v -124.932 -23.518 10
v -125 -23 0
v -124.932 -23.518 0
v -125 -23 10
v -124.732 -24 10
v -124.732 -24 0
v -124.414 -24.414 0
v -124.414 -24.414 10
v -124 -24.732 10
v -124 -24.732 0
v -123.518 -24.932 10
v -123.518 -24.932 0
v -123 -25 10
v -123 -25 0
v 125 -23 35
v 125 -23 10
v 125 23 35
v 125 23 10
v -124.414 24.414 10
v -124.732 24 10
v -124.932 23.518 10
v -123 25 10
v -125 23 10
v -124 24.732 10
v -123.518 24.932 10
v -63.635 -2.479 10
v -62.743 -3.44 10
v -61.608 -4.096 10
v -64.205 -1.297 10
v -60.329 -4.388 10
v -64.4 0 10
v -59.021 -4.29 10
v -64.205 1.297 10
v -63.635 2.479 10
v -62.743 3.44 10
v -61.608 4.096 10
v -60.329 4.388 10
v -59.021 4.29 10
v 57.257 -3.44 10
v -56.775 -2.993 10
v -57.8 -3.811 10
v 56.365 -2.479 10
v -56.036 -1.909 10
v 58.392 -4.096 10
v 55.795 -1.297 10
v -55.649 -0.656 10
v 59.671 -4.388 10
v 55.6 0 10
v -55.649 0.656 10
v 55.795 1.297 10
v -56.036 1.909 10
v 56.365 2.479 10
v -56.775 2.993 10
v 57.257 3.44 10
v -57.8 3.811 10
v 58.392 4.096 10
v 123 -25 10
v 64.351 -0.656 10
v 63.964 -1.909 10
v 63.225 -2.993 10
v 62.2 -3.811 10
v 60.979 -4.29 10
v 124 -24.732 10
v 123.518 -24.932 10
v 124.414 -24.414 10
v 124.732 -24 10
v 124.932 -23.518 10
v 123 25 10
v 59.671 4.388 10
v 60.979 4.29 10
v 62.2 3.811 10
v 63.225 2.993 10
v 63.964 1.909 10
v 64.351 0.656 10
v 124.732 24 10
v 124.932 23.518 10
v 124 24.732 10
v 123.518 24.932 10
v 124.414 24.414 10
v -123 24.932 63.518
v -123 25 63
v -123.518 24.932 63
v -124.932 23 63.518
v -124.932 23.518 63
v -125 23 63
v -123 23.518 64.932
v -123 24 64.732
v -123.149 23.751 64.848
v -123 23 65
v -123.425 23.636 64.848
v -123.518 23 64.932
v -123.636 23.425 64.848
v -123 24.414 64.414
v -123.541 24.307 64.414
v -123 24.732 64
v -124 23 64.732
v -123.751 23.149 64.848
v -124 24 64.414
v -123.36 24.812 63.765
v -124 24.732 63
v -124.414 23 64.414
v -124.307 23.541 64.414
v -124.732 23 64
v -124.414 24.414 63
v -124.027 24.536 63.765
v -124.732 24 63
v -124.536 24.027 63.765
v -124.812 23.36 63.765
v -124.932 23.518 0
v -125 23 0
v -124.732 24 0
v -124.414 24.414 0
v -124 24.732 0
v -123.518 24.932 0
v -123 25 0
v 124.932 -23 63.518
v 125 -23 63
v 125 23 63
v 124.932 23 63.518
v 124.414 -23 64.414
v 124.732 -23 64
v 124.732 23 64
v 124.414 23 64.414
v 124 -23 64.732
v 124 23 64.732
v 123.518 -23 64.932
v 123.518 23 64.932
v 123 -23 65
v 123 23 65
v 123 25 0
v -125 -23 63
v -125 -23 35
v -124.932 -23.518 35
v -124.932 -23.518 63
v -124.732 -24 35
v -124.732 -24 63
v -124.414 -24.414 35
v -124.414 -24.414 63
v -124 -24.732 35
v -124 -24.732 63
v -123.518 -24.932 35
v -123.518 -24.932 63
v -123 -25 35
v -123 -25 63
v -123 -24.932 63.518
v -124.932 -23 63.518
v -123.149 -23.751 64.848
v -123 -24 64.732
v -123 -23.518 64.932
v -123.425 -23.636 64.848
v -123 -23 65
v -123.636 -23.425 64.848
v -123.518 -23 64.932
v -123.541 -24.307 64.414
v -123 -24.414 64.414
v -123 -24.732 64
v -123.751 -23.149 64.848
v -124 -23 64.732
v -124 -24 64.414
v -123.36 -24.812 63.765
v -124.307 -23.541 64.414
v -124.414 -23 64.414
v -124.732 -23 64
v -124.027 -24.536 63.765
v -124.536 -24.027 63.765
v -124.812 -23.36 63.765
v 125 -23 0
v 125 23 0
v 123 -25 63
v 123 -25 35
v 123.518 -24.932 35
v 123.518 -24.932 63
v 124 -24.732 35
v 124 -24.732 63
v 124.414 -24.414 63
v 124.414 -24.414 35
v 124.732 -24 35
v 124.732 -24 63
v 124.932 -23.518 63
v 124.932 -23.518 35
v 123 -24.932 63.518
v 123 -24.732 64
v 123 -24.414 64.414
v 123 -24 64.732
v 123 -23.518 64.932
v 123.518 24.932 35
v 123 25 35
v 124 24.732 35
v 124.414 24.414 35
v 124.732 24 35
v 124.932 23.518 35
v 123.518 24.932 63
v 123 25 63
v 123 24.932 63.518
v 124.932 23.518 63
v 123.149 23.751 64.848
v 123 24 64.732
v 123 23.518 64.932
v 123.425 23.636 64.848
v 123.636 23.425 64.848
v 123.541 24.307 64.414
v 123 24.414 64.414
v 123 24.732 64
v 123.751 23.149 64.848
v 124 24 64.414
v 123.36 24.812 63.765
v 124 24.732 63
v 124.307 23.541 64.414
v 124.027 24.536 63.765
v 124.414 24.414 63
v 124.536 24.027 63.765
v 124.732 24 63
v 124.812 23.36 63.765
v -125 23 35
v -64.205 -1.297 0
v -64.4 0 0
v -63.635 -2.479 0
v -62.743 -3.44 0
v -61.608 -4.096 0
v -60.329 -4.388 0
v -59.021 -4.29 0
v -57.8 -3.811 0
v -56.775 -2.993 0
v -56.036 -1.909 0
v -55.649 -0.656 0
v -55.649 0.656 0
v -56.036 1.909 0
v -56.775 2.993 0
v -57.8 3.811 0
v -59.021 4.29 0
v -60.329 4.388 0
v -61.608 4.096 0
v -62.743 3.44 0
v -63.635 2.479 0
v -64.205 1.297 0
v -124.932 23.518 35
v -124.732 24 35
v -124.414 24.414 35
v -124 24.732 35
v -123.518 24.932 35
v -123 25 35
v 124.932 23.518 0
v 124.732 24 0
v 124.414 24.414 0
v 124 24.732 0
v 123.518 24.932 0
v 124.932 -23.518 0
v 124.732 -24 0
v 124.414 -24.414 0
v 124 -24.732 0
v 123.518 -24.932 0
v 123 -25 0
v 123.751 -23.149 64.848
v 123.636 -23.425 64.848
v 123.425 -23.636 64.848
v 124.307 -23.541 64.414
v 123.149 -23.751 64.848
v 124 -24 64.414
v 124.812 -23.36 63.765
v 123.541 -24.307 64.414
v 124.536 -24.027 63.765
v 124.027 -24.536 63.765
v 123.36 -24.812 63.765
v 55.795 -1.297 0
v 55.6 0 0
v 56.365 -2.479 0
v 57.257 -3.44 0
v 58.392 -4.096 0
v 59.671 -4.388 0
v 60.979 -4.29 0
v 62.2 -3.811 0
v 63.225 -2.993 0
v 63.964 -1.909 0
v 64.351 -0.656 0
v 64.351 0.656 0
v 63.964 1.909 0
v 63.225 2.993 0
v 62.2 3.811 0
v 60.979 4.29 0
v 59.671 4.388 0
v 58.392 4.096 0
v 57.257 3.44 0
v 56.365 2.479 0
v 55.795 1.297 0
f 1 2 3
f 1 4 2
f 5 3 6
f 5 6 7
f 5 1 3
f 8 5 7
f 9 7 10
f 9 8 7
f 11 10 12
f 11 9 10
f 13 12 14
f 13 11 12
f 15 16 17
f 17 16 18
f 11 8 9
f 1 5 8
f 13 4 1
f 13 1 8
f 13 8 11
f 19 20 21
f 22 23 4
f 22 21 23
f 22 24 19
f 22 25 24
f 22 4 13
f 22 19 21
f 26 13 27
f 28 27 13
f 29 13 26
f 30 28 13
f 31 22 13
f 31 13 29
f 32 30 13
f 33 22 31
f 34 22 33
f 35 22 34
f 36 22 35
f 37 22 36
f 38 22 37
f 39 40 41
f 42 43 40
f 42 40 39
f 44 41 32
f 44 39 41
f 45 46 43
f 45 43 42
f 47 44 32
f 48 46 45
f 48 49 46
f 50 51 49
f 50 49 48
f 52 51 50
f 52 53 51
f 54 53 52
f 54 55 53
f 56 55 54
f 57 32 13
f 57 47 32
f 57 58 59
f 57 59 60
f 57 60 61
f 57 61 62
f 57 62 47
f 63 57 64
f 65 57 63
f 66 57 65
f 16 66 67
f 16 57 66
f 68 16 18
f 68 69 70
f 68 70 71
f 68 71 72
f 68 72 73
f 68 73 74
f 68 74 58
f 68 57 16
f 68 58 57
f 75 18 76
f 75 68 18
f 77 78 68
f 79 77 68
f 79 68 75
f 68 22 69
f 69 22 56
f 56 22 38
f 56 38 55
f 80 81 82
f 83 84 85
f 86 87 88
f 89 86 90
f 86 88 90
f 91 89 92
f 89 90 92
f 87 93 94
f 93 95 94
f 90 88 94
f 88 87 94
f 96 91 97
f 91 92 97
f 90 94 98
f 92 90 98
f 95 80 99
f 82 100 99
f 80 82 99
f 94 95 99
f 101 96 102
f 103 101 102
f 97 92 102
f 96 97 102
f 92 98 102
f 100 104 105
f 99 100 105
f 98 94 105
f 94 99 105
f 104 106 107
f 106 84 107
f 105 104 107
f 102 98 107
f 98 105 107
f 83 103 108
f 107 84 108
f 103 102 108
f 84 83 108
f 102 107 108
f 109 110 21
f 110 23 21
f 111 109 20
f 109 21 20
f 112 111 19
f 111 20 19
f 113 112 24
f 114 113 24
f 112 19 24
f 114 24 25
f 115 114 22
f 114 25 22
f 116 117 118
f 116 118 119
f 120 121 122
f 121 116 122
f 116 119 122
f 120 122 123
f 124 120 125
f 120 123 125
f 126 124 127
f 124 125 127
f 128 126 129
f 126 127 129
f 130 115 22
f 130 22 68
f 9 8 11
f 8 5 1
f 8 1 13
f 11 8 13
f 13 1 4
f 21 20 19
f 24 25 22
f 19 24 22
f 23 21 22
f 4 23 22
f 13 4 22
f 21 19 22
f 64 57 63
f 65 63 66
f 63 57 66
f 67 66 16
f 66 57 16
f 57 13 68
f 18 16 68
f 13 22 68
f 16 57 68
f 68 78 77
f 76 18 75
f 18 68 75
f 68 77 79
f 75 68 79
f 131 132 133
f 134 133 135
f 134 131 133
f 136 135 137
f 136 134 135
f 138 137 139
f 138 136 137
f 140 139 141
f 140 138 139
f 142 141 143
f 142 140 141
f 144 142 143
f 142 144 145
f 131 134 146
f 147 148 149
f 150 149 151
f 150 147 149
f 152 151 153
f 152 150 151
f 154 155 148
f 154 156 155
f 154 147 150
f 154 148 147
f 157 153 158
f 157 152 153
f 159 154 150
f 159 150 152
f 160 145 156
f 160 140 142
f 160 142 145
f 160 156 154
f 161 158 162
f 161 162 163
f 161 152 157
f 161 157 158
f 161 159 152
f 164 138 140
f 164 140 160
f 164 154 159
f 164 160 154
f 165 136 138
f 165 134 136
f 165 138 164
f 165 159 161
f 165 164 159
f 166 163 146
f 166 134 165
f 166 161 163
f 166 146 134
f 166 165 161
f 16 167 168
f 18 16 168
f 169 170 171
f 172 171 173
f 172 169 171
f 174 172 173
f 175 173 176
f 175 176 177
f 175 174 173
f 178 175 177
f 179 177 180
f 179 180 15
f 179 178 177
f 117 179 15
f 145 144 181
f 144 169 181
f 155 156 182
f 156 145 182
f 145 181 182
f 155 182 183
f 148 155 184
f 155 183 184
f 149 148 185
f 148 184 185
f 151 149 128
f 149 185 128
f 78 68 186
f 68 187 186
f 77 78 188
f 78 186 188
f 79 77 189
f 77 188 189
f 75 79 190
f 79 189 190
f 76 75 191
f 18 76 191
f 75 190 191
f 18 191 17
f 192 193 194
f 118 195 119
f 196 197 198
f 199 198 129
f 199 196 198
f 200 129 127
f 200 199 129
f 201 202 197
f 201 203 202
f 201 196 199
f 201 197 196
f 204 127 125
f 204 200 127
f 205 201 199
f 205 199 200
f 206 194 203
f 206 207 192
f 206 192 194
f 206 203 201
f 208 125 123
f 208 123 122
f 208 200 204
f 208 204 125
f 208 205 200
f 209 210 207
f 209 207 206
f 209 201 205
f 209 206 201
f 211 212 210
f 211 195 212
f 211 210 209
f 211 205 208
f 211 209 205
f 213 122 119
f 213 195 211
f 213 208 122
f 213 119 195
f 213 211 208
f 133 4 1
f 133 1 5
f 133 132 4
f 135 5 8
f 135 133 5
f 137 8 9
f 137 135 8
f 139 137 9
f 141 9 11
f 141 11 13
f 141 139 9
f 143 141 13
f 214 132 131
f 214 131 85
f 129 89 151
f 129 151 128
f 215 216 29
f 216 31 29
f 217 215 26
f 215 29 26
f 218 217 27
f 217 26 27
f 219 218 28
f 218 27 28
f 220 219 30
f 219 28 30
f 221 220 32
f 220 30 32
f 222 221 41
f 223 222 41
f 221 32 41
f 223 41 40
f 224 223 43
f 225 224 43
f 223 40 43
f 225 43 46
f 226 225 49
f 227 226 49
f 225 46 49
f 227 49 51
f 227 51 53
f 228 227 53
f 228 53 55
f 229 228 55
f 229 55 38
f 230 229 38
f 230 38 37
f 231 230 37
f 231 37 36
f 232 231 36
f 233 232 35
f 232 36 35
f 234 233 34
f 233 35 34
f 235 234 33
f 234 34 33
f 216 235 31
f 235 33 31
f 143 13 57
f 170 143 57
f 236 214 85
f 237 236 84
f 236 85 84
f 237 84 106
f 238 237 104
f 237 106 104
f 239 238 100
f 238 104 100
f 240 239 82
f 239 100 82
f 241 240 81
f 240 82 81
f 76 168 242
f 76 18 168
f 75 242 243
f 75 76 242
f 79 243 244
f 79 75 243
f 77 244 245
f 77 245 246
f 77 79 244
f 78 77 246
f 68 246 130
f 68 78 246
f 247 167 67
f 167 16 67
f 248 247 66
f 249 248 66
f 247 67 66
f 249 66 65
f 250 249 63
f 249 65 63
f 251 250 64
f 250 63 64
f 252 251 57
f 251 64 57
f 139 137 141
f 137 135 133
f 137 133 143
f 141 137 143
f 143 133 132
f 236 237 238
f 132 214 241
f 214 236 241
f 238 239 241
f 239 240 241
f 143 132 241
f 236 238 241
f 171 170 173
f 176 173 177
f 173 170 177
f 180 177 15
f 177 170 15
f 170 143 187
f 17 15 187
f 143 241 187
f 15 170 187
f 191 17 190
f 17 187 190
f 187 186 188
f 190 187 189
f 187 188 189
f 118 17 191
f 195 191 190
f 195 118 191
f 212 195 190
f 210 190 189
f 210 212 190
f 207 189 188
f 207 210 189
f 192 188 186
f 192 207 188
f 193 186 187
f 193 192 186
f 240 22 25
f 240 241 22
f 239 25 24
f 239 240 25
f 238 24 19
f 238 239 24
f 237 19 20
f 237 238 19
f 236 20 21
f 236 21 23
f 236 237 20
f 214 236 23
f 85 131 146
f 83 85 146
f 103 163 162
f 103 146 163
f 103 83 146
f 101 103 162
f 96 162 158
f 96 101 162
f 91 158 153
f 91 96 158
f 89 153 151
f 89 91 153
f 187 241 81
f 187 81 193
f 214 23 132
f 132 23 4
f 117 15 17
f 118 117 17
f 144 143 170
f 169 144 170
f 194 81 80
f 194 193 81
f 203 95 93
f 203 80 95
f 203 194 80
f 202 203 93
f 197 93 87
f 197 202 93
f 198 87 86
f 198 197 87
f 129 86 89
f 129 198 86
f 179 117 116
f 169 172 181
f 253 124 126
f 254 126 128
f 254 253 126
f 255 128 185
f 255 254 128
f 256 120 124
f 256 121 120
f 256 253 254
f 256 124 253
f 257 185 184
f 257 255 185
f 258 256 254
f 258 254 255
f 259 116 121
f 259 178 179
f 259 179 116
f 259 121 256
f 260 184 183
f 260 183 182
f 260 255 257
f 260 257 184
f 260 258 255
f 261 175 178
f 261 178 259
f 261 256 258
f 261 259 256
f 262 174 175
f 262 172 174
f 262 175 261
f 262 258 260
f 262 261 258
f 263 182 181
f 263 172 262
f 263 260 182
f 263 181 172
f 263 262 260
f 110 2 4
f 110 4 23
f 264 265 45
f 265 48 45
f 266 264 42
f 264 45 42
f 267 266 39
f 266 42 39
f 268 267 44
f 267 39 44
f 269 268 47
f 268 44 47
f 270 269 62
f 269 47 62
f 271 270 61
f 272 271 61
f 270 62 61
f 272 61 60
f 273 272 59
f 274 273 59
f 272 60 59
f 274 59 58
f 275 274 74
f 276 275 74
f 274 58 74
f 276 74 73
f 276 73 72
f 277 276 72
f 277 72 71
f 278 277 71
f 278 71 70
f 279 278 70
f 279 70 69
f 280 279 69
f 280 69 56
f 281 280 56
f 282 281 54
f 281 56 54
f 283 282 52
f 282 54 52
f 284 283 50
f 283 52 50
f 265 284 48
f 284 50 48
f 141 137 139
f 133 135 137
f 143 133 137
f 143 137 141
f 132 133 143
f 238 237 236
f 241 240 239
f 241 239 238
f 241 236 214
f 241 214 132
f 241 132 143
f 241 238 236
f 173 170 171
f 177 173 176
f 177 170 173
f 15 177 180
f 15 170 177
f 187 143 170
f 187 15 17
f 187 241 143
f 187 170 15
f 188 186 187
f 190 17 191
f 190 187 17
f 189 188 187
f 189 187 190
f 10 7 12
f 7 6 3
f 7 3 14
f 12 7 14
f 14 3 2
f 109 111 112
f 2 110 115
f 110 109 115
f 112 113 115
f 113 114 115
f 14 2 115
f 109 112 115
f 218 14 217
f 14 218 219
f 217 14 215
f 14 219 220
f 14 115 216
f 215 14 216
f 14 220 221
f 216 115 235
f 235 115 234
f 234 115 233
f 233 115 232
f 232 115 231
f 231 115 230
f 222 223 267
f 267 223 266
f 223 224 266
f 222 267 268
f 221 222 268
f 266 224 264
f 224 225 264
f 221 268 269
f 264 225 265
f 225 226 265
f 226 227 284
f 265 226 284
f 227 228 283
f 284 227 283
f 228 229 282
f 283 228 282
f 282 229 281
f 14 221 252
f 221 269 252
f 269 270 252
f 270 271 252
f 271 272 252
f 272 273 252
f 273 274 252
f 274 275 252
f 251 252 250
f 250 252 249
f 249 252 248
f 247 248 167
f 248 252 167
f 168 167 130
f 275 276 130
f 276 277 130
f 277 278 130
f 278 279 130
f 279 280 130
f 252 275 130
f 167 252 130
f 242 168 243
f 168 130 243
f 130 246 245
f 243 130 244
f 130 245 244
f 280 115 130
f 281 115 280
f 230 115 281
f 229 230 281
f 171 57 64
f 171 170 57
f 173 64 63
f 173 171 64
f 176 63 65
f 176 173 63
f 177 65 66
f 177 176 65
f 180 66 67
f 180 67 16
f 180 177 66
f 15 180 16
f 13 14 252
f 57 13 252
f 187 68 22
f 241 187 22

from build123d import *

# Parameters (mm, degrees)
F0_W     = 250
F0_H     = 50
F1_DEPTH = 10
F3_DEPTH = 25
F5_D     = 8.8
F5_DEPTH = 10
F5_TIP   = 2.6437867237
F4_W     = 250
F4_H     = 50
F6_DEPTH = 30
F7_R     = 2
F7_2_R   = 2
F7_3_R   = 2


with BuildPart() as f1:
    # F0 (on Top) → F1 (new body)
    with BuildSketch(Plane.XY):
        Rectangle(F0_W, F0_H)
    extrude(amount=F1_DEPTH)

    # F5
    with Locations(Plane(origin=(0, 0, 0), x_dir=(1, 0, 0), z_dir=(0, 0, -1))):
        with Locations((-60, 0), (60, 0)):
            Hole(F5_D / 2, depth=F5_DEPTH)
            with Locations((0, 0, -(F5_DEPTH + F5_TIP / 2))):  # 118° drill point
                Cone(0, F5_D / 2, F5_TIP, mode=Mode.SUBTRACT)

    # F7
    f7_edges = [f1.edges().sort_by_distance(p)[0] for p in [
        (-125, -25, 5),
        (-125, 25, 5),
        (125, 25, 5),
        (125, -25, 5),
    ]]
    fillet(f7_edges, radius=F7_R)


with BuildPart() as f3:
    # F2 (on face) → F3 (new body)
    with BuildSketch(Plane.XY.offset(10)):
        Polygon((125, 25), (-125, 25), (-125, -25), (-119.9850216508, -25), (125, -25), align=None)
    extrude(amount=F3_DEPTH)

    # F7#2
    f7_2_edges = [f3.edges().sort_by_distance(p)[0] for p in [
        (-125, -25, 22.5),
        (-125, 25, 22.5),
        (125, -25, 22.5),
        (125, 25, 22.5),
    ]]
    fillet(f7_2_edges, radius=F7_2_R)


with BuildPart() as f6:
    # F4 (on face) → F6 (new body)
    with BuildSketch(Plane.XY.offset(35)):
        Rectangle(F4_W, F4_H)
    extrude(amount=F6_DEPTH)

    # F7#3
    f7_3_edges = [f6.edges().sort_by_distance(p)[0] for p in [
        (-125, -25, 50),
        (-125, 25, 50),
        (125, -25, 50),
        (125, 25, 50),
        (0, 25, 65),
        (125, 0, 65),
        (0, -25, 65),
        (-125, 0, 65),
    ]]
    fillet(f7_3_edges, radius=F7_3_R)


solid = Compound([f1.part, f3.part, f6.part])
